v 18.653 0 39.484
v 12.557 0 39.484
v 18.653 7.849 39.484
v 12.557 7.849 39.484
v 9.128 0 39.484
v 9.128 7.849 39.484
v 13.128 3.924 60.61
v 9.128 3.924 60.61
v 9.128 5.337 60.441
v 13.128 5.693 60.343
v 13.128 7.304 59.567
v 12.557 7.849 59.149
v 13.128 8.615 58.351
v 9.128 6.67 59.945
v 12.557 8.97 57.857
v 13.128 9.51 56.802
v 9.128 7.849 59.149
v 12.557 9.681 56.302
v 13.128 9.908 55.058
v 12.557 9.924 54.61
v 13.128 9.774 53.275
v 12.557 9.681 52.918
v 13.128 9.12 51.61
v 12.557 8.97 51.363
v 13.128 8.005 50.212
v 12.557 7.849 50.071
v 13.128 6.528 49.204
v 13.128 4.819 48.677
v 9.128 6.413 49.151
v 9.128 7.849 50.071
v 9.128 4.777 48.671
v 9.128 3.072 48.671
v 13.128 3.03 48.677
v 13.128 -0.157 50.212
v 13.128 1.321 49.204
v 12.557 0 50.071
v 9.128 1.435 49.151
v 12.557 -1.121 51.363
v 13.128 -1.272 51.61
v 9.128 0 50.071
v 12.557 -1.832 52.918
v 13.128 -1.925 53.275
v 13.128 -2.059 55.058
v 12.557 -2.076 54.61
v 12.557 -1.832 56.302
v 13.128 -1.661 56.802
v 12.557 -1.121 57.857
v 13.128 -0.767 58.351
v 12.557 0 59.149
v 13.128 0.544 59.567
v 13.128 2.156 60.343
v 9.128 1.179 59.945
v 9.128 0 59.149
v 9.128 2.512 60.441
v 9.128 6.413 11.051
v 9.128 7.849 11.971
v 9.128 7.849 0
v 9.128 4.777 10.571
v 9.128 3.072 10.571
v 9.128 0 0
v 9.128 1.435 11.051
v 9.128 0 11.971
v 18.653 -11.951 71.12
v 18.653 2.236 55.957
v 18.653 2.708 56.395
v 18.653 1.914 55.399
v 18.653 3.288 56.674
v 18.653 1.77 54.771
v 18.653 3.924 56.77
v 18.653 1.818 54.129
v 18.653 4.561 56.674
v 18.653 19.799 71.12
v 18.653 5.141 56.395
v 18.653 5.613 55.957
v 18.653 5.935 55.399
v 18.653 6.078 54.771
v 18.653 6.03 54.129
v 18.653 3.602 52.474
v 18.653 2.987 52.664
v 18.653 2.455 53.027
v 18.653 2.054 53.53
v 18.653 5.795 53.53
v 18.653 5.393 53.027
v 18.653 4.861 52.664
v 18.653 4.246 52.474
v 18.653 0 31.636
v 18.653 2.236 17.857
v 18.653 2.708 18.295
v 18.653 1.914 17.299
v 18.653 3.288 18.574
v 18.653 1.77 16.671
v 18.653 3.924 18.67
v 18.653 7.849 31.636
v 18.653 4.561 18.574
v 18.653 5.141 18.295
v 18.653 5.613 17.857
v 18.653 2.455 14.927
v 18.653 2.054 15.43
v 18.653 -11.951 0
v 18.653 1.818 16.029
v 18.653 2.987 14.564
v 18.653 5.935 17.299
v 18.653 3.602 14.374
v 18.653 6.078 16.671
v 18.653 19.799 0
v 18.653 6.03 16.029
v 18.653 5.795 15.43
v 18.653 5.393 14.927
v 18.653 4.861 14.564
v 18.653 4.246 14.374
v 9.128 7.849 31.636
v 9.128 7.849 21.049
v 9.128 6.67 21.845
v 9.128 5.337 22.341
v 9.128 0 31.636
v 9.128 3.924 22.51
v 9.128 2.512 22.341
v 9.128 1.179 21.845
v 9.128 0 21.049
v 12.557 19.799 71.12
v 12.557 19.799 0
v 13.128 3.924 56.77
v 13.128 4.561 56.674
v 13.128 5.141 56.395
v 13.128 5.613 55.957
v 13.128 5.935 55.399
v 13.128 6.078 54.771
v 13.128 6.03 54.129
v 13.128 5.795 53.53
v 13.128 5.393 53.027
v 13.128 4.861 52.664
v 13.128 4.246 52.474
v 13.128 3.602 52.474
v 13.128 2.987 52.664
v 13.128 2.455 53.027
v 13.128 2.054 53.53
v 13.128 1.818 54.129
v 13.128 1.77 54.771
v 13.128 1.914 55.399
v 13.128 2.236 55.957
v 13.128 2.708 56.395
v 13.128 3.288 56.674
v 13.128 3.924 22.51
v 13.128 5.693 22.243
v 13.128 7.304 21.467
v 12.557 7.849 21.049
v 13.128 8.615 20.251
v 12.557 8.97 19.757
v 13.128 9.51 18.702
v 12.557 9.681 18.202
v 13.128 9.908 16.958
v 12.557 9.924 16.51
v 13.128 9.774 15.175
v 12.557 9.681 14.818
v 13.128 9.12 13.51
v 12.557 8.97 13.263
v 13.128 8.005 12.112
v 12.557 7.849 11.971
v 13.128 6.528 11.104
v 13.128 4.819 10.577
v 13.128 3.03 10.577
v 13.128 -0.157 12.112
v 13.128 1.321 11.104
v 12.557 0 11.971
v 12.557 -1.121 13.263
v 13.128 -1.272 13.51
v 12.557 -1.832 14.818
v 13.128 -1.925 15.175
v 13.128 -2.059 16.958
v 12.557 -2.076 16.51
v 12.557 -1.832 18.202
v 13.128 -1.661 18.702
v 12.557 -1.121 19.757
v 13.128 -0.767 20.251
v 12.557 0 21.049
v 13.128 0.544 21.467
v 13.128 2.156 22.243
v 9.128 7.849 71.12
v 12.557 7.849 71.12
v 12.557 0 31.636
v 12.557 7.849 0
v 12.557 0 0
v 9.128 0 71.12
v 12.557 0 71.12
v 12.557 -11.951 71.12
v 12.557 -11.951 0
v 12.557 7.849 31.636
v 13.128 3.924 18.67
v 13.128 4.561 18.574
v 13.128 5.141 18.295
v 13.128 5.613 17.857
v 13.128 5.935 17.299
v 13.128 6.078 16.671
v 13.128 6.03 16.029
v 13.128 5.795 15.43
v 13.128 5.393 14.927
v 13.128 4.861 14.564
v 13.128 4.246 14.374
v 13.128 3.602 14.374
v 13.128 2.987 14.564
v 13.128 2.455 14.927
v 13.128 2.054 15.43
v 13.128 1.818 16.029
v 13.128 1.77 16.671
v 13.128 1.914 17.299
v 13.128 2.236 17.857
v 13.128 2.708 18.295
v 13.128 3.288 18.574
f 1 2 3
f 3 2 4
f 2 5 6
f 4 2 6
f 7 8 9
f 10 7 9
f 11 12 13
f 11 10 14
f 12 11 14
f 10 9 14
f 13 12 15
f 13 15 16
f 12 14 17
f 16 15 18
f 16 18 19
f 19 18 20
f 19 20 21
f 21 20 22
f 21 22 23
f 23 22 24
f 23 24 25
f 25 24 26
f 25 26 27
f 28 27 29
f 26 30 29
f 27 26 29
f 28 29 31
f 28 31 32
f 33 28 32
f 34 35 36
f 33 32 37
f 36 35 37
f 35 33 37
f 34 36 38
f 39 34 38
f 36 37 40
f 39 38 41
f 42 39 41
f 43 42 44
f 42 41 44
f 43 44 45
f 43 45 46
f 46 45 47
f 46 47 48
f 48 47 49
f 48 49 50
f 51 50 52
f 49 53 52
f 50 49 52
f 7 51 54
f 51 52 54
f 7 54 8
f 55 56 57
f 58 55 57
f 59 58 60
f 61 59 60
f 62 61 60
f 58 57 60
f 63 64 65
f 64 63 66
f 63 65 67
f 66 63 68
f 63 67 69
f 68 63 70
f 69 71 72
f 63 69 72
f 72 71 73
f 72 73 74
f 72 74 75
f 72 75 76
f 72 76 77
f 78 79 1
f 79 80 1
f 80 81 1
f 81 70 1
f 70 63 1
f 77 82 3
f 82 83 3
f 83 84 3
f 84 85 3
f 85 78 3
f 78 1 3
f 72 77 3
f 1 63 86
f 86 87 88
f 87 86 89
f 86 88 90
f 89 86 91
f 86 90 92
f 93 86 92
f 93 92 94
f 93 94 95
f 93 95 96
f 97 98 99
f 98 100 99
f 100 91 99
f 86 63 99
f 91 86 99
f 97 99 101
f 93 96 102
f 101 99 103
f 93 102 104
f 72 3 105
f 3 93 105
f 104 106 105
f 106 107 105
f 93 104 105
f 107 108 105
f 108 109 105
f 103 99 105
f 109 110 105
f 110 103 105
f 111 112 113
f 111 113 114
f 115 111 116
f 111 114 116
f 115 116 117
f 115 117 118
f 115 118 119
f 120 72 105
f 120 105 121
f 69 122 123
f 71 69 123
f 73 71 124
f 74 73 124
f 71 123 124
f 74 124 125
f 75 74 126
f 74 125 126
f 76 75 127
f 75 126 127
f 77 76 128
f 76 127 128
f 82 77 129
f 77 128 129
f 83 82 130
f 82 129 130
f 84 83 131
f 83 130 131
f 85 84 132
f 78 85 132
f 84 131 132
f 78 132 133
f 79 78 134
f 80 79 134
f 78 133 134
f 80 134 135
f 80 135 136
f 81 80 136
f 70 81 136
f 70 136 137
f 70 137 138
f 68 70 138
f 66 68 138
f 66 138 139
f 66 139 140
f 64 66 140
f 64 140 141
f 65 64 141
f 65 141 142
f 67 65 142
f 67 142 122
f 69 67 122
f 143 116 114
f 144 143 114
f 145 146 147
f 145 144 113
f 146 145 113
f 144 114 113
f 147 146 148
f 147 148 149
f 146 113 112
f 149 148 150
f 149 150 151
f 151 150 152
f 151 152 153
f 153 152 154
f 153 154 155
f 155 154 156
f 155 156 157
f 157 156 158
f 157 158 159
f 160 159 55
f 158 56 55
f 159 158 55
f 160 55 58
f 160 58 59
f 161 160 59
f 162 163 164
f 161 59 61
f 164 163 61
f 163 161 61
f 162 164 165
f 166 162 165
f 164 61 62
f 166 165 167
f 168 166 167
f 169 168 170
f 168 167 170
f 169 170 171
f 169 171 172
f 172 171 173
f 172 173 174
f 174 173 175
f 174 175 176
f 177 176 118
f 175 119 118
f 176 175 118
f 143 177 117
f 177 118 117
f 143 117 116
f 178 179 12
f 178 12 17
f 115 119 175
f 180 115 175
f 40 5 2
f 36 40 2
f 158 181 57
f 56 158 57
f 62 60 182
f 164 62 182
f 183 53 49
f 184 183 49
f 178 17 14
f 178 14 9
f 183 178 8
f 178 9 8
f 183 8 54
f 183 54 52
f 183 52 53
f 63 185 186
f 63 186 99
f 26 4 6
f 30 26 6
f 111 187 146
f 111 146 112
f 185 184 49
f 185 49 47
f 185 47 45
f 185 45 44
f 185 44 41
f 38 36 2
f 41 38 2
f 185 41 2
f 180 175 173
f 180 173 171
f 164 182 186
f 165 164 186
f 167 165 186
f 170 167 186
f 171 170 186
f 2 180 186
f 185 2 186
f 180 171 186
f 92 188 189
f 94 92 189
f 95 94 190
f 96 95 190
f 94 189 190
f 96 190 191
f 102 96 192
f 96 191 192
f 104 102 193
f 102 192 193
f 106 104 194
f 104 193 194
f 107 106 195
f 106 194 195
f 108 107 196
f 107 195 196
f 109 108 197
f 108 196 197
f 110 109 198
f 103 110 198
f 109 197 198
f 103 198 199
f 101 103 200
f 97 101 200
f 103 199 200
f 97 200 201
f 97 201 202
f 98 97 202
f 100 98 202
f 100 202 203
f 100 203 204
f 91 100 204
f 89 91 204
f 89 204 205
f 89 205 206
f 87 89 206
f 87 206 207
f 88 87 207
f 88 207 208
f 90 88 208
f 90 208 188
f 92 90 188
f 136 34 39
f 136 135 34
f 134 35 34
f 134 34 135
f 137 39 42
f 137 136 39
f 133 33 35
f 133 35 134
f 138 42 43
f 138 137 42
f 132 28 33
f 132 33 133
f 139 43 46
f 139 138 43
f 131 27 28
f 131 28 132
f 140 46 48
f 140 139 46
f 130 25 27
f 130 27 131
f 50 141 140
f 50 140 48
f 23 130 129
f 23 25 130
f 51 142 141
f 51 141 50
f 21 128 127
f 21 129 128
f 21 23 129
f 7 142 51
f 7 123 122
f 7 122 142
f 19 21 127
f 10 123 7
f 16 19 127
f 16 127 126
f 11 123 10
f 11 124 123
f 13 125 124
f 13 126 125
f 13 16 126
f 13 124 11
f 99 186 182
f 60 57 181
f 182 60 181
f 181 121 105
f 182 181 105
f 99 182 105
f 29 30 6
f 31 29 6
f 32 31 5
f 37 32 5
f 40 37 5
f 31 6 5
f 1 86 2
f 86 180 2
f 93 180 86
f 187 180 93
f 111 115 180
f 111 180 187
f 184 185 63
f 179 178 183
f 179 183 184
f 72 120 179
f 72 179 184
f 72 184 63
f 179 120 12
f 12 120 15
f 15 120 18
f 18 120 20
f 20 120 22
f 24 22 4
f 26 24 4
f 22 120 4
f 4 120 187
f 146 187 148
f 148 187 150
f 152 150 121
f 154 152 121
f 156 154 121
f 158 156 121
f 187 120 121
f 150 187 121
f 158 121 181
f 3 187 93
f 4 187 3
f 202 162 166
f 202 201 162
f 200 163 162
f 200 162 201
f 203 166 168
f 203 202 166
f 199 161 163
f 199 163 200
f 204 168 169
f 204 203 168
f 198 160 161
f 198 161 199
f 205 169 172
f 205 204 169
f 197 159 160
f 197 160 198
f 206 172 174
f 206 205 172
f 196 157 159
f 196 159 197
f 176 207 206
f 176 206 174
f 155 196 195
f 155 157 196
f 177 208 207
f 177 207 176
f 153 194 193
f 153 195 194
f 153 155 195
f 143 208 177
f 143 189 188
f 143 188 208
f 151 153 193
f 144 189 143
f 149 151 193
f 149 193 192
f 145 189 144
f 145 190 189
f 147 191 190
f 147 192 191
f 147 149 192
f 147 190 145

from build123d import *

# Parameters (mm, degrees)
BOSS_EXTRUDE1_DEPTH = 71.12
SKETCH2_R           = 6
CUT_EXTRUDE1_DEPTH  = 4
CUT_EXTRUDE2_REACH  = 76.031
SKETCH3_R           = 2.16
CUT_EXTRUDE3_REACH  = 76.436
SKETCH5_W           = 7.8486
SKETCH5_H           = 7.8486


with BuildPart() as part:
    # Sketch1 → Boss-Extrude1 (new body)
    with BuildSketch(Plane.XY):
        Polygon((9.127895876, 7.8486), (9.127895876, 0), (12.556895876, 0), (12.556895876, -11.9507), (18.652895876, -11.9507), (18.652895876, 19.7993), (12.556895876, 19.7993), (12.556895876, 7.8486), align=None)
    extrude(amount=BOSS_EXTRUDE1_DEPTH)

    # Sketch2 → Cut-Extrude1 (cut)
    with BuildSketch(Plane.ZY.offset(-9.127895876)):
        with Locations((16.51, 3.9243)):
            Circle(SKETCH2_R)
        with Locations((54.61, 3.9243)):
            Circle(SKETCH2_R)
    extrude(amount=-CUT_EXTRUDE1_DEPTH, mode=Mode.SUBTRACT)

    # Sketch3 → Cut-Extrude2 (cut, up to next)
    with BuildSketch(Plane.ZY.offset(-13.127895876), mode=Mode.PRIVATE) as cut_extrude2_sk1:
        with Locations((16.51, 3.9243)):
            Circle(SKETCH3_R)
    cut_extrude2_tool1 = extrude(cut_extrude2_sk1.sketch, amount=-CUT_EXTRUDE2_REACH, mode=Mode.PRIVATE) & part.part
    # Sketch3 → Cut-Extrude2 (cut, up to next)
    with BuildSketch(Plane.ZY.offset(-13.127895876), mode=Mode.PRIVATE) as cut_extrude2_sk2:
        with Locations((54.61, 3.9243)):
            Circle(SKETCH3_R)
    cut_extrude2_tool2 = extrude(cut_extrude2_sk2.sketch, amount=-CUT_EXTRUDE2_REACH, mode=Mode.PRIVATE) & part.part
    add(cut_extrude2_tool1.solids().sort_by_distance((13.127896, 3.9243, 16.51))[0], mode=Mode.SUBTRACT)
    add(cut_extrude2_tool2.solids().sort_by_distance((13.127896, 3.9243, 54.61))[0], mode=Mode.SUBTRACT)

    # Sketch5 → Cut-Extrude3 (cut, up to next)
    with BuildSketch(Plane.ZY.offset(-9.127895876), mode=Mode.PRIVATE) as cut_extrude3_sk1:
        with Locations((35.56, 3.9243)):
            Rectangle(SKETCH5_W, SKETCH5_H)
    cut_extrude3_tool1 = extrude(cut_extrude3_sk1.sketch, amount=-CUT_EXTRUDE3_REACH, mode=Mode.PRIVATE) & part.part
    add(cut_extrude3_tool1.solids().sort_by_distance((9.127896, 3.9243, 35.56))[0], mode=Mode.SUBTRACT)


solid = part.part
